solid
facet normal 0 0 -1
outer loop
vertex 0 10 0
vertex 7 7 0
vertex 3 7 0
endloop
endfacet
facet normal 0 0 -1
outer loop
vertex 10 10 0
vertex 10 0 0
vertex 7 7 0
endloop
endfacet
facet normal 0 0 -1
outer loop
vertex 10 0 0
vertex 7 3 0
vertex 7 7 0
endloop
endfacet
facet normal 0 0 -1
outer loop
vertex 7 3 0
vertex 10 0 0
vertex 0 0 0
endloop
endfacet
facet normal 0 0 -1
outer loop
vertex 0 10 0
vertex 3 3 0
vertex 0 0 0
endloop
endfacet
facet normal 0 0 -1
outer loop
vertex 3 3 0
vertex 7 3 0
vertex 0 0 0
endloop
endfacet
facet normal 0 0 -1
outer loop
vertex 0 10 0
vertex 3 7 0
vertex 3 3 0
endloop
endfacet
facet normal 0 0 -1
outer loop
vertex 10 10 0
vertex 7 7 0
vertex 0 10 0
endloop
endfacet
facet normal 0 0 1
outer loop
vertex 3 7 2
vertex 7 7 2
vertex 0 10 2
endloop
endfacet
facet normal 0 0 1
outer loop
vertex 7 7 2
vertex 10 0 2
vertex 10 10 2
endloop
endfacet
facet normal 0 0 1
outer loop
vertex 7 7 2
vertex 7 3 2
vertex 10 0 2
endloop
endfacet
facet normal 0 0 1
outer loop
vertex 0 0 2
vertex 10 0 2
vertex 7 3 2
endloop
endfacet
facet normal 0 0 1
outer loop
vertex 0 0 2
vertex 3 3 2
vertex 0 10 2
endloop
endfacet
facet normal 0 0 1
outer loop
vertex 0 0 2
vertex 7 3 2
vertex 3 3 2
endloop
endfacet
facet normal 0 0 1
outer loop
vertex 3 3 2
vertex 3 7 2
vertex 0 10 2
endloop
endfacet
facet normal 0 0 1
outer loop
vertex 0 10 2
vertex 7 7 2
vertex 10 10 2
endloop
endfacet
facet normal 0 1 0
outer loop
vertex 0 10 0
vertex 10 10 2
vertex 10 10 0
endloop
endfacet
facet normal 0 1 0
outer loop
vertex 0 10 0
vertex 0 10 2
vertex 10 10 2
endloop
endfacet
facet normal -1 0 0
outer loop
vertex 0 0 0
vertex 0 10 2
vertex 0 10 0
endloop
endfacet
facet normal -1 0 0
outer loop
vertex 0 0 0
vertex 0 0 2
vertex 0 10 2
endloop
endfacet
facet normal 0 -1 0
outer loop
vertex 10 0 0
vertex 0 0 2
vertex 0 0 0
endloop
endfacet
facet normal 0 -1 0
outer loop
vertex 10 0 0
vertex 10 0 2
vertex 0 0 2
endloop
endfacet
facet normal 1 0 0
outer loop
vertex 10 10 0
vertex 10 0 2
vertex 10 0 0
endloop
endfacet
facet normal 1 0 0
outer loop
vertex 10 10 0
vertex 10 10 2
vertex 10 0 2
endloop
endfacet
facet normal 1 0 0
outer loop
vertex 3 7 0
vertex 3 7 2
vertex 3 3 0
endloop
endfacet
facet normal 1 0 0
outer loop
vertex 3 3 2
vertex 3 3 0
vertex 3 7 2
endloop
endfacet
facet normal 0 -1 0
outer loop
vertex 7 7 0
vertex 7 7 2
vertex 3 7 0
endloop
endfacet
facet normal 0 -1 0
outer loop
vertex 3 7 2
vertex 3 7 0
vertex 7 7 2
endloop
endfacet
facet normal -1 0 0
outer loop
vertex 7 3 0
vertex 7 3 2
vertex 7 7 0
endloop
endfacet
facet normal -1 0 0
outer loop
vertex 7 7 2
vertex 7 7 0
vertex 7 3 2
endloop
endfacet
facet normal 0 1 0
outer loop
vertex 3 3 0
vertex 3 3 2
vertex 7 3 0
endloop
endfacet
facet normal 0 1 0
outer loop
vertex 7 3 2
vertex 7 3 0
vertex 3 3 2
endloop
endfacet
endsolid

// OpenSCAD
// polygon with an outer path and a hole
linear_extrude(2)
  polygon(points = [[0, 0], [10, 0], [10, 10], [0, 10], [3, 3], [7, 3], [7, 7], [3, 7]],
          paths = [[0, 1, 2, 3], [4, 5, 6, 7]]);
